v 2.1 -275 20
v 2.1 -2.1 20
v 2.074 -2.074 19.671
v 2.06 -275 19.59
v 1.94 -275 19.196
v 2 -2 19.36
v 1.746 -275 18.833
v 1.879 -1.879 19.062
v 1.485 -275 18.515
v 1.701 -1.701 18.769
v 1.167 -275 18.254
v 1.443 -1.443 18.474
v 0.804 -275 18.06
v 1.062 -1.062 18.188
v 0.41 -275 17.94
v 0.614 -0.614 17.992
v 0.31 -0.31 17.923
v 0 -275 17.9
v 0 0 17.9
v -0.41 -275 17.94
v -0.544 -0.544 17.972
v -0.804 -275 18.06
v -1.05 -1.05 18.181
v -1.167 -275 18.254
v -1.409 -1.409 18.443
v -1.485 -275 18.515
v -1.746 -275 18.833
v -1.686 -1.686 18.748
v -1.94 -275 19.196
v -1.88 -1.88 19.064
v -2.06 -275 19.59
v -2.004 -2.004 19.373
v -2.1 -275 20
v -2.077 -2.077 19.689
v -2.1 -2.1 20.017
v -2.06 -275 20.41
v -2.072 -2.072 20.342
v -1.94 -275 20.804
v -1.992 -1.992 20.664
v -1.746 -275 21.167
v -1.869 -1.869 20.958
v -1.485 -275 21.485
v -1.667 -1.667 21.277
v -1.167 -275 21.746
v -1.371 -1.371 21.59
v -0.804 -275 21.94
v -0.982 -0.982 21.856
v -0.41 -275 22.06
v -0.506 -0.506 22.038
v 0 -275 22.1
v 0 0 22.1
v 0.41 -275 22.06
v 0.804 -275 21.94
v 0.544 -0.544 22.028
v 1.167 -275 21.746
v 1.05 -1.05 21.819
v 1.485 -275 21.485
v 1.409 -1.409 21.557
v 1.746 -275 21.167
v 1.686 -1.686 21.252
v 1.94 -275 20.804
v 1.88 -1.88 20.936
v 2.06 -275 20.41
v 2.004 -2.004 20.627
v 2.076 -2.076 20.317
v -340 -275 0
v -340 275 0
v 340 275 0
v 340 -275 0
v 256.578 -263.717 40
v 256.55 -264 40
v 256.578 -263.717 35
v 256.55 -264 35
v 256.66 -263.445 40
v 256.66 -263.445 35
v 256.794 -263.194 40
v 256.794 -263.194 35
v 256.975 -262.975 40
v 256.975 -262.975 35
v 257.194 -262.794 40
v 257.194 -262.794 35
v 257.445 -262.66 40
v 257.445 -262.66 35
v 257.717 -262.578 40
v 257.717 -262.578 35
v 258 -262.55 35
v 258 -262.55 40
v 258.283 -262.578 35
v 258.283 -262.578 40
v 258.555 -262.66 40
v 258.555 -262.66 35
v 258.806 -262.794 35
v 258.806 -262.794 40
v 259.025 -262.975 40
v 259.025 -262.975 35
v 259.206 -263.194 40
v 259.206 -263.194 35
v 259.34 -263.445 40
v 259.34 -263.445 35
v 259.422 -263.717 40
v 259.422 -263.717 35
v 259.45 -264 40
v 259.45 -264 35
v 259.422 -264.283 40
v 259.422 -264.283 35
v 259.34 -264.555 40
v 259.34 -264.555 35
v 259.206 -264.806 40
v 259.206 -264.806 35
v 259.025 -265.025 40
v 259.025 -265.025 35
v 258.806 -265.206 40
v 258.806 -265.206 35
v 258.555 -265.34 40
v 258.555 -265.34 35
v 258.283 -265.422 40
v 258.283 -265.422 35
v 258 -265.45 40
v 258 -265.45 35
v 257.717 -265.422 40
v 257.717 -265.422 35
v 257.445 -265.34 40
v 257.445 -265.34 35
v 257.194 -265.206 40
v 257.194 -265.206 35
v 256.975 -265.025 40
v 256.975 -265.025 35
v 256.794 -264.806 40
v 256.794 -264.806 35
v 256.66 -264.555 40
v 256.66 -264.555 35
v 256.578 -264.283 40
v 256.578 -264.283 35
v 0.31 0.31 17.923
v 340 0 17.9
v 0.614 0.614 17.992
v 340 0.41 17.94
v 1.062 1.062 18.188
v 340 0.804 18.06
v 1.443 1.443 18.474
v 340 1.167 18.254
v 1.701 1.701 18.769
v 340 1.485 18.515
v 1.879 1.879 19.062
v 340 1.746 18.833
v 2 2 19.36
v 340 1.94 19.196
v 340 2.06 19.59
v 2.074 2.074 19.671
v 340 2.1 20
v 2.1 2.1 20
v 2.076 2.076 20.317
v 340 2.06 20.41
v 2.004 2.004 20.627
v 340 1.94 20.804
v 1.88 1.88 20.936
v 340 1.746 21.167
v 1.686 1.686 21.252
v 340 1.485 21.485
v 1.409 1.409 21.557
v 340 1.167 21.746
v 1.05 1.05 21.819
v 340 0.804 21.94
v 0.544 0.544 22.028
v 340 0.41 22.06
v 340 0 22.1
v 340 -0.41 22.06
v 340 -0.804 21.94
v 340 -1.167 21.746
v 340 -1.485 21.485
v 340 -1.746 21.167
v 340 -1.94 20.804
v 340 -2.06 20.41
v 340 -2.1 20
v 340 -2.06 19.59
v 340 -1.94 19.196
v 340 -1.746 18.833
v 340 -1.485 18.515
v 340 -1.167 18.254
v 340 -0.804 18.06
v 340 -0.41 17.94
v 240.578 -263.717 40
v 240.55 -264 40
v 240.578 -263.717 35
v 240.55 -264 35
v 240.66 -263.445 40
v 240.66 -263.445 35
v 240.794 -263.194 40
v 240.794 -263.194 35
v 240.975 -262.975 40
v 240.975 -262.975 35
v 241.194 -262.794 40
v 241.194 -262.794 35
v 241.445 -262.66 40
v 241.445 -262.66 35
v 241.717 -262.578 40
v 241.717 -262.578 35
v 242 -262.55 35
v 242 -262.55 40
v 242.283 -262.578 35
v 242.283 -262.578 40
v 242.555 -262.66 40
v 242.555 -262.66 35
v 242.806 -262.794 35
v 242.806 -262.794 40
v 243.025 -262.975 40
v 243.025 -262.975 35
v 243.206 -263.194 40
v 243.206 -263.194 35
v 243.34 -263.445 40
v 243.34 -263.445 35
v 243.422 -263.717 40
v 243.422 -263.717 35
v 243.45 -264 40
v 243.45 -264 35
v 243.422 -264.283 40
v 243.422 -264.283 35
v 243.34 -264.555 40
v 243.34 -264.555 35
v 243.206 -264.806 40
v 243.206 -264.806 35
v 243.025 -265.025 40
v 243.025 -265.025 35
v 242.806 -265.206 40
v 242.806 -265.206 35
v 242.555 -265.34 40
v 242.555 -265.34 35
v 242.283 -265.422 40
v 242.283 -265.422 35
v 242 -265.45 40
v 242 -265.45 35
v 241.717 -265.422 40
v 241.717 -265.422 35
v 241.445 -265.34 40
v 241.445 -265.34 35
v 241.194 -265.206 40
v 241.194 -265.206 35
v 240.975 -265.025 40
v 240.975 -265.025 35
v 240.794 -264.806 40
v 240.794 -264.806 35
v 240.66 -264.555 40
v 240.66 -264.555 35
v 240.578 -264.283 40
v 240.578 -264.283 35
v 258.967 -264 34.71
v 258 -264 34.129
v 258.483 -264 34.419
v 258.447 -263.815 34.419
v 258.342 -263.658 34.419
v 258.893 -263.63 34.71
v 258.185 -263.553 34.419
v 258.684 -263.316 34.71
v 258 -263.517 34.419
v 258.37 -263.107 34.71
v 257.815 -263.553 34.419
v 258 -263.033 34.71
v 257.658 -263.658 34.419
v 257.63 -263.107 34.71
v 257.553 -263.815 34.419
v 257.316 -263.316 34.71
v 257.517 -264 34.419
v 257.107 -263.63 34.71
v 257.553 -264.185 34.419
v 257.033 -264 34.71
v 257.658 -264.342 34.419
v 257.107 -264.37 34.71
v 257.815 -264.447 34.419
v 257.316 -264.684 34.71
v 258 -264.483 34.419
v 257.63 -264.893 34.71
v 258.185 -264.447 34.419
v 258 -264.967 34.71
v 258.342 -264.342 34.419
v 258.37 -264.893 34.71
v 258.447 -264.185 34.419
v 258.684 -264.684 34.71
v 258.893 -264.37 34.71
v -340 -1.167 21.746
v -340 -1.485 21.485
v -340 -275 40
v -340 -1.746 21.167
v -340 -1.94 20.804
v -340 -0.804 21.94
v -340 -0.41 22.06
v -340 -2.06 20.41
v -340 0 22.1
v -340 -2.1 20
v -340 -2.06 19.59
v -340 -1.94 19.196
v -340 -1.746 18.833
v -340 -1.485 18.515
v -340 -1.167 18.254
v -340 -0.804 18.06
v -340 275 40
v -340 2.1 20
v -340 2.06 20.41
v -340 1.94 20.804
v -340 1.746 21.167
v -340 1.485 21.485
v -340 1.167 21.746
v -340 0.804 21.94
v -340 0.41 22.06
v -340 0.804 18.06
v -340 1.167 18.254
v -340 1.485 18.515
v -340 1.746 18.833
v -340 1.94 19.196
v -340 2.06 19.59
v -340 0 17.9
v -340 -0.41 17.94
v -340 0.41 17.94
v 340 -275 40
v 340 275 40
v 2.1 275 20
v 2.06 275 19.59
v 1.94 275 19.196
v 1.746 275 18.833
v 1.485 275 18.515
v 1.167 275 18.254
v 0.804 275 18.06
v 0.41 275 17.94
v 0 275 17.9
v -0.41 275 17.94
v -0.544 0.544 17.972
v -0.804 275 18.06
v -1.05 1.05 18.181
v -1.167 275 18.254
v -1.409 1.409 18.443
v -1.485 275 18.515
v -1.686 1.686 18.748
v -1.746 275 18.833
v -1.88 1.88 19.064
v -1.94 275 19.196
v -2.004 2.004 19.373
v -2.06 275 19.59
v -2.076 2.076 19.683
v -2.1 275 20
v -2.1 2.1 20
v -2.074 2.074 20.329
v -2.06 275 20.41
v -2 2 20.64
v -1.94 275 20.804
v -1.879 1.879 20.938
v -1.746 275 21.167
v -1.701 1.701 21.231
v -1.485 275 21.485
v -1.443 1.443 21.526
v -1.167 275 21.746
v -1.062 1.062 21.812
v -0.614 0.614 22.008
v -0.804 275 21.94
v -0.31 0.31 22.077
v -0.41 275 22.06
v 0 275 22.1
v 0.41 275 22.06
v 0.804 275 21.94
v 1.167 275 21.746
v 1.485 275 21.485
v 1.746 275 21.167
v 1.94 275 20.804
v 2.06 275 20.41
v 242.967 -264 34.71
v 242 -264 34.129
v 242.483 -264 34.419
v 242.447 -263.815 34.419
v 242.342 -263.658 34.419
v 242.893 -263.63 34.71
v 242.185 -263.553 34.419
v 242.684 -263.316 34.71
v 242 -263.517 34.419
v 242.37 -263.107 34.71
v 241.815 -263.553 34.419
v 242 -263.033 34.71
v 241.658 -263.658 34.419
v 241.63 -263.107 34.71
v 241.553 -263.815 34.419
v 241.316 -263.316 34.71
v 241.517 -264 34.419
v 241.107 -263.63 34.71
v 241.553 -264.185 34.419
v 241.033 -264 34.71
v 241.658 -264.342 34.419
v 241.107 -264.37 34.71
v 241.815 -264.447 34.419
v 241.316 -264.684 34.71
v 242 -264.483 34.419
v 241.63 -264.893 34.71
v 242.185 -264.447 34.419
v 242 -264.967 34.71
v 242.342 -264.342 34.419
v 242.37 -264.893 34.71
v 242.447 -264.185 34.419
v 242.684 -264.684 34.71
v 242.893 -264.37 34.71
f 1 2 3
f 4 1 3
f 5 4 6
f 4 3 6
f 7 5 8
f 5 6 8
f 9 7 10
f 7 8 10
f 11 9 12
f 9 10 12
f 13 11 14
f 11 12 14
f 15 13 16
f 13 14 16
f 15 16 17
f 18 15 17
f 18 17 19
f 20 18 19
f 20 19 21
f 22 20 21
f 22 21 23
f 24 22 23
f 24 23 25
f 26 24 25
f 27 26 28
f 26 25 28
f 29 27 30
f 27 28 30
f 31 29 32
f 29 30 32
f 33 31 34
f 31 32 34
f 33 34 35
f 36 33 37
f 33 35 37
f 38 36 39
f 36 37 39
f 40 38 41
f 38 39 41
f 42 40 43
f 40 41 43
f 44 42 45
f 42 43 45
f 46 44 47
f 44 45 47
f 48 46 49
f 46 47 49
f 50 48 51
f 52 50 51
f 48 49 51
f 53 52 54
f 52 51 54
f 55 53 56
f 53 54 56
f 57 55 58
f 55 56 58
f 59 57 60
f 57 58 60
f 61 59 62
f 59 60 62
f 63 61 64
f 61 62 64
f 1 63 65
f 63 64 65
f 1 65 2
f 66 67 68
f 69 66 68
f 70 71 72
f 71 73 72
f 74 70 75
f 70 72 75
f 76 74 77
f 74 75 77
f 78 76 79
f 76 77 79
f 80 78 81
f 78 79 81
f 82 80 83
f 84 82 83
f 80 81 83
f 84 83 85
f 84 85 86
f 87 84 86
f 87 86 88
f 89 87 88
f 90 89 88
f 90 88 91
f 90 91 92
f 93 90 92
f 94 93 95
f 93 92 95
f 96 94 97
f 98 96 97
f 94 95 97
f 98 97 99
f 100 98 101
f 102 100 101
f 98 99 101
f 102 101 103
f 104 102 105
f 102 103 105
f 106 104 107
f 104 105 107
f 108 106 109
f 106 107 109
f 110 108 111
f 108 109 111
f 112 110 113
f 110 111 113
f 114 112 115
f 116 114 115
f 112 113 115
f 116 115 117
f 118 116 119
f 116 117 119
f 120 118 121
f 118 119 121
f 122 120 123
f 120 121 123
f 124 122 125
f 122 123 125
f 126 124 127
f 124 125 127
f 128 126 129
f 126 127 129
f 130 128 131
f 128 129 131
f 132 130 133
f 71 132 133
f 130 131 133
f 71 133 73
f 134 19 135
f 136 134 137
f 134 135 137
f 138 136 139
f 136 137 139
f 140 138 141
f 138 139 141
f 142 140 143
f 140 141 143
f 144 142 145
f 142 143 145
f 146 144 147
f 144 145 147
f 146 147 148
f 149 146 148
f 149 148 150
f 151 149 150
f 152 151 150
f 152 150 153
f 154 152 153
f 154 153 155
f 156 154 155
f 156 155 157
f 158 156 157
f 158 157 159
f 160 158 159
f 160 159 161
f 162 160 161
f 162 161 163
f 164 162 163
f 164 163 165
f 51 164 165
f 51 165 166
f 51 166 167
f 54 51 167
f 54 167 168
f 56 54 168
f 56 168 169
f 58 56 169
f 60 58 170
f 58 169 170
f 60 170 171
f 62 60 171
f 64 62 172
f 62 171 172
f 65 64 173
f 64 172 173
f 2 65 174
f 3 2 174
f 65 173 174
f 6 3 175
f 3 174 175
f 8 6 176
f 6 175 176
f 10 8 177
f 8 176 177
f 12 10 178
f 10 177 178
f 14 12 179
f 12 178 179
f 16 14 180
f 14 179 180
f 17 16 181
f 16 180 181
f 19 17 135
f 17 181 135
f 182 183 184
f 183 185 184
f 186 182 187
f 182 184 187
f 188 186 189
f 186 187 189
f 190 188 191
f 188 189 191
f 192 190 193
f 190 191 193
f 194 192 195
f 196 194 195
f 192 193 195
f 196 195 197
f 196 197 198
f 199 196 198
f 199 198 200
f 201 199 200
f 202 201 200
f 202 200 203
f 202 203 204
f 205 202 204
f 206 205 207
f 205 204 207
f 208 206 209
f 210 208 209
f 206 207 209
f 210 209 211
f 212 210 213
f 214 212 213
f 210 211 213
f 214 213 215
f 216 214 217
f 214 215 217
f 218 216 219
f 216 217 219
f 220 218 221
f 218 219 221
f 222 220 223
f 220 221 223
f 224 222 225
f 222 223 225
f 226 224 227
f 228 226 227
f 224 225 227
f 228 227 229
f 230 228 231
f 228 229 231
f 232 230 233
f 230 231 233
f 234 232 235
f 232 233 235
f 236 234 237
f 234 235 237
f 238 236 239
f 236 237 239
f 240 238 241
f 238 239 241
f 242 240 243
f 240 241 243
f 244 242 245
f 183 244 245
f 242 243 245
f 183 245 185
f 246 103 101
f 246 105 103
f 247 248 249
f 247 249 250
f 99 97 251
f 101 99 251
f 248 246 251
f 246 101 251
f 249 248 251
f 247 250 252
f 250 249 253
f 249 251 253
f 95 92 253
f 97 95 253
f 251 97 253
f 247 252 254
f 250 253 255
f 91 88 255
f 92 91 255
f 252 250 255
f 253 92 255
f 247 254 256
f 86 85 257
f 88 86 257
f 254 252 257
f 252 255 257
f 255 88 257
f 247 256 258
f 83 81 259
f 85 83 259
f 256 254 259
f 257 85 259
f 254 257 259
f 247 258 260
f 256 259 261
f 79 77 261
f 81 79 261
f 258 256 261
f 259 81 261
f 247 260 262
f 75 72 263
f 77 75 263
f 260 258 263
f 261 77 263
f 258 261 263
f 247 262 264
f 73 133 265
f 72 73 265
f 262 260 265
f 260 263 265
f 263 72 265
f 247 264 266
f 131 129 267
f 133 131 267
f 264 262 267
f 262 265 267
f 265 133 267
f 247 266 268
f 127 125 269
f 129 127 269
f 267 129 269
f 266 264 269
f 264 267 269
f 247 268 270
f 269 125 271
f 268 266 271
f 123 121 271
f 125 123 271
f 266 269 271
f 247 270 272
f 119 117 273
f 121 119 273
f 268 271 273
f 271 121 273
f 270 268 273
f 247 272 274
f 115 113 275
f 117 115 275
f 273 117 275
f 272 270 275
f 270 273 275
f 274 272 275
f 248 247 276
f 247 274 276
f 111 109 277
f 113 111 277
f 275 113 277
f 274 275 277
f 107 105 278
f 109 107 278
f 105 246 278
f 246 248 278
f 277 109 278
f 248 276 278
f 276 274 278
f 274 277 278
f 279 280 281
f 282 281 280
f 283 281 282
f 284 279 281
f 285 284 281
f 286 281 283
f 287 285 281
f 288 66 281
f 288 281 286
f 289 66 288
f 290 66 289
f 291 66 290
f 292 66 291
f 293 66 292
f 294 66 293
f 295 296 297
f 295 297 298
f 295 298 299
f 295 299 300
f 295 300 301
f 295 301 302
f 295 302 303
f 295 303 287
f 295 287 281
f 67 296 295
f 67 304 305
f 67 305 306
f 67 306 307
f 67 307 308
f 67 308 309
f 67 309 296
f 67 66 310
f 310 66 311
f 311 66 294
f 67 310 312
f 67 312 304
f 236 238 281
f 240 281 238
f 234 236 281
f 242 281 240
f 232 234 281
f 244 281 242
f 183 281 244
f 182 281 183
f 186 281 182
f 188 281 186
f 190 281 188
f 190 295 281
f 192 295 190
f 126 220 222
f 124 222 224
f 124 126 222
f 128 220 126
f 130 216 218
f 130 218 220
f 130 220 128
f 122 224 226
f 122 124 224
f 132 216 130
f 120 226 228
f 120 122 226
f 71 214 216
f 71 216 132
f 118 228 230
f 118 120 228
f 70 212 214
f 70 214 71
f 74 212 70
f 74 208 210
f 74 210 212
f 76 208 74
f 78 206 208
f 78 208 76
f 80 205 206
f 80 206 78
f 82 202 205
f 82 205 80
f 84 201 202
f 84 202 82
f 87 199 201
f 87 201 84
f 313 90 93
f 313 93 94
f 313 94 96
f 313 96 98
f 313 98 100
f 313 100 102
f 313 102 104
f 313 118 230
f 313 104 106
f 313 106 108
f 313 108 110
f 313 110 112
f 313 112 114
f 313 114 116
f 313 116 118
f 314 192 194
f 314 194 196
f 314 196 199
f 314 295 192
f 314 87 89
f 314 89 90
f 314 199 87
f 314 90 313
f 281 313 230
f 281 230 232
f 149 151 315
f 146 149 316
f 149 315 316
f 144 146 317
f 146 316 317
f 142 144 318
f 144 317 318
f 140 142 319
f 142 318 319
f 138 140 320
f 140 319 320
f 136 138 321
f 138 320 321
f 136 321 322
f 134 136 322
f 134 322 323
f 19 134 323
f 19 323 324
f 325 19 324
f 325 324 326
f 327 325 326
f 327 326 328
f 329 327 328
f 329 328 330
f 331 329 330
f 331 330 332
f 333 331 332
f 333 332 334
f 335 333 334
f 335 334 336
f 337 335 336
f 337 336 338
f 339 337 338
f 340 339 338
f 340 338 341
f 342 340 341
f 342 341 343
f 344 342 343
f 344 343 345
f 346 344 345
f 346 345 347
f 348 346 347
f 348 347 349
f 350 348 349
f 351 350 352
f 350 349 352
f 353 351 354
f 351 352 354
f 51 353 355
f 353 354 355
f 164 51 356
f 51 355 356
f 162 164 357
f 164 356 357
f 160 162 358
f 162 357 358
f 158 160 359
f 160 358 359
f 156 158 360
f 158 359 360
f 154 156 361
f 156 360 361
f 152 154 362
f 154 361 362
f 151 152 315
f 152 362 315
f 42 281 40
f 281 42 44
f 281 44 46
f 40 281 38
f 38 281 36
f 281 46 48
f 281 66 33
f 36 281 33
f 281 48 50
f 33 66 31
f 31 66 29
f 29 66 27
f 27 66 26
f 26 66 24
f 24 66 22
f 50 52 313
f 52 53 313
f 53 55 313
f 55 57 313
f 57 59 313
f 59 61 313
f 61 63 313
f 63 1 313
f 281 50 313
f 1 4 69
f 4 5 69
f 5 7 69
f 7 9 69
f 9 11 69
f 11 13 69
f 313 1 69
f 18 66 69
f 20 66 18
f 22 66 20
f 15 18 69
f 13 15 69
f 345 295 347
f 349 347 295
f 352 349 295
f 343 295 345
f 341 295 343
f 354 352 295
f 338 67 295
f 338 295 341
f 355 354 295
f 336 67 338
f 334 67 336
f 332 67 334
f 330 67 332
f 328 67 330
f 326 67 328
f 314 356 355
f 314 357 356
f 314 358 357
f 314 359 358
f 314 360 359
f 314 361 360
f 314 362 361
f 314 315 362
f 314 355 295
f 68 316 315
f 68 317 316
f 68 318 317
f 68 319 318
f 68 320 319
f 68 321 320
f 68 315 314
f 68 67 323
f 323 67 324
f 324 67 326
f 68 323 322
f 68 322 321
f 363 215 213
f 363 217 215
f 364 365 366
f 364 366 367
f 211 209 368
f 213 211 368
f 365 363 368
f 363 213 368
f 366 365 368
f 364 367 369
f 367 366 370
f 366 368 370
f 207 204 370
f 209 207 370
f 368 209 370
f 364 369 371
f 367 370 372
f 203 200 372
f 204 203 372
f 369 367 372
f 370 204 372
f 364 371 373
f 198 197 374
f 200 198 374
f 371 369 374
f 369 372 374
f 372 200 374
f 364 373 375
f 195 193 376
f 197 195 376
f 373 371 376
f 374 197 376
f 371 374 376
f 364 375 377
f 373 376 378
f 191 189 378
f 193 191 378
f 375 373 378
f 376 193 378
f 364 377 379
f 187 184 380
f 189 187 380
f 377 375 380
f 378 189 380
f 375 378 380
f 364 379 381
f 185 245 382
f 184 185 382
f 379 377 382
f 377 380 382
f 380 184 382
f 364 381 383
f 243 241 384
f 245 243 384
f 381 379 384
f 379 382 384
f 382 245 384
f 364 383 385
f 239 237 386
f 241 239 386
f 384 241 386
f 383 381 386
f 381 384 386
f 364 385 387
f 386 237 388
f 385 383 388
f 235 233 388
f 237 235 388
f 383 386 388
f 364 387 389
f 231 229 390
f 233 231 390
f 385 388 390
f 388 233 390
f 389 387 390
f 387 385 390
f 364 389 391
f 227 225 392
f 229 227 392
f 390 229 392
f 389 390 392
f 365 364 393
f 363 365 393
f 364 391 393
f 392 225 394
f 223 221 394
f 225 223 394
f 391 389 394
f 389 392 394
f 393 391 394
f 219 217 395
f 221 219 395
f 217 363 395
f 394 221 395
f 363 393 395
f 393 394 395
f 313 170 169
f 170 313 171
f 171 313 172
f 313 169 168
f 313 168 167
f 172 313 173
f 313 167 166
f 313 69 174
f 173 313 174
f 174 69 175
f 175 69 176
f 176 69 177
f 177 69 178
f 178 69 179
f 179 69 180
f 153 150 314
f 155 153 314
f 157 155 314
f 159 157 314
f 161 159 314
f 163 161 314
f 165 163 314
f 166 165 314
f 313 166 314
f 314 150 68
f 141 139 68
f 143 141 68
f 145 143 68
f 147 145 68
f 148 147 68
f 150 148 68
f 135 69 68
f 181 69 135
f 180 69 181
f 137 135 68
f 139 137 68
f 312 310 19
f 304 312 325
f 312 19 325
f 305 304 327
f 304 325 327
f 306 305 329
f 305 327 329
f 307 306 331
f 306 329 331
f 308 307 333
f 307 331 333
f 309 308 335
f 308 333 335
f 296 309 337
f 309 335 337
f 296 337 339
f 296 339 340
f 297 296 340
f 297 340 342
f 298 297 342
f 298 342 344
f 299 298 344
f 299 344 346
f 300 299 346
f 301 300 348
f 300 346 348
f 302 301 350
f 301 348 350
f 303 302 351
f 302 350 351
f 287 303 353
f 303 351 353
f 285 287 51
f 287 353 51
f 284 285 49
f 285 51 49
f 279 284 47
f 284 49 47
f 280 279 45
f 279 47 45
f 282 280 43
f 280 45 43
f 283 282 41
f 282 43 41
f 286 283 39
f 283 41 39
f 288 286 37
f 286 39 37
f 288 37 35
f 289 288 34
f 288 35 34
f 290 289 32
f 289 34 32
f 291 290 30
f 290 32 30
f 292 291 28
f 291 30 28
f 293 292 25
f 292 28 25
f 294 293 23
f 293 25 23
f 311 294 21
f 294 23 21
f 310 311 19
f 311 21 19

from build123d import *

# Parameters (mm, degrees)
SKETCH_1_W               = 680
SKETCH_1_H               = 550
EXTRUDE_1_DEPTH          = 40
HOLE_WIZARD_M5_1_D       = 4.2
HOLE_WIZARD_M5_2_D       = 4.2
HOLE_WIZARD_M3_5_1_D     = 2.9
HOLE_WIZARD_M3_5_1_DEPTH = 5
HOLE_WIZARD_M3_5_1_TIP   = 0.871247898


with BuildPart() as part:
    # 草图1 → 凸台-拉伸1 (new body)
    with BuildSketch(Plane.XY):
        Rectangle(SKETCH_1_W, SKETCH_1_H)
    extrude(amount=EXTRUDE_1_DEPTH)

    # M5 螺纹孔1 (through all)
    with Locations(Plane(origin=(0, -275, 0), x_dir=(-1, 0, 0), z_dir=(0, -1, 0))):
        with Locations((0, -20)):
            Hole(HOLE_WIZARD_M5_1_D / 2)

    # M5 螺纹孔2 (through all)
    with Locations(Plane.ZY.offset(340)):
        with Locations((20, 0)):
            Hole(HOLE_WIZARD_M5_2_D / 2)

    # M3.5 螺纹孔1
    with Locations(Plane.XY.offset(40)):
        with Locations((258, -264), (242, -264)):
            Hole(HOLE_WIZARD_M3_5_1_D / 2, depth=HOLE_WIZARD_M3_5_1_DEPTH)
            with Locations((0, 0, -(HOLE_WIZARD_M3_5_1_DEPTH + HOLE_WIZARD_M3_5_1_TIP / 2))):  # 118° drill point
                Cone(0, HOLE_WIZARD_M3_5_1_D / 2, HOLE_WIZARD_M3_5_1_TIP, mode=Mode.SUBTRACT)


solid = part.part
